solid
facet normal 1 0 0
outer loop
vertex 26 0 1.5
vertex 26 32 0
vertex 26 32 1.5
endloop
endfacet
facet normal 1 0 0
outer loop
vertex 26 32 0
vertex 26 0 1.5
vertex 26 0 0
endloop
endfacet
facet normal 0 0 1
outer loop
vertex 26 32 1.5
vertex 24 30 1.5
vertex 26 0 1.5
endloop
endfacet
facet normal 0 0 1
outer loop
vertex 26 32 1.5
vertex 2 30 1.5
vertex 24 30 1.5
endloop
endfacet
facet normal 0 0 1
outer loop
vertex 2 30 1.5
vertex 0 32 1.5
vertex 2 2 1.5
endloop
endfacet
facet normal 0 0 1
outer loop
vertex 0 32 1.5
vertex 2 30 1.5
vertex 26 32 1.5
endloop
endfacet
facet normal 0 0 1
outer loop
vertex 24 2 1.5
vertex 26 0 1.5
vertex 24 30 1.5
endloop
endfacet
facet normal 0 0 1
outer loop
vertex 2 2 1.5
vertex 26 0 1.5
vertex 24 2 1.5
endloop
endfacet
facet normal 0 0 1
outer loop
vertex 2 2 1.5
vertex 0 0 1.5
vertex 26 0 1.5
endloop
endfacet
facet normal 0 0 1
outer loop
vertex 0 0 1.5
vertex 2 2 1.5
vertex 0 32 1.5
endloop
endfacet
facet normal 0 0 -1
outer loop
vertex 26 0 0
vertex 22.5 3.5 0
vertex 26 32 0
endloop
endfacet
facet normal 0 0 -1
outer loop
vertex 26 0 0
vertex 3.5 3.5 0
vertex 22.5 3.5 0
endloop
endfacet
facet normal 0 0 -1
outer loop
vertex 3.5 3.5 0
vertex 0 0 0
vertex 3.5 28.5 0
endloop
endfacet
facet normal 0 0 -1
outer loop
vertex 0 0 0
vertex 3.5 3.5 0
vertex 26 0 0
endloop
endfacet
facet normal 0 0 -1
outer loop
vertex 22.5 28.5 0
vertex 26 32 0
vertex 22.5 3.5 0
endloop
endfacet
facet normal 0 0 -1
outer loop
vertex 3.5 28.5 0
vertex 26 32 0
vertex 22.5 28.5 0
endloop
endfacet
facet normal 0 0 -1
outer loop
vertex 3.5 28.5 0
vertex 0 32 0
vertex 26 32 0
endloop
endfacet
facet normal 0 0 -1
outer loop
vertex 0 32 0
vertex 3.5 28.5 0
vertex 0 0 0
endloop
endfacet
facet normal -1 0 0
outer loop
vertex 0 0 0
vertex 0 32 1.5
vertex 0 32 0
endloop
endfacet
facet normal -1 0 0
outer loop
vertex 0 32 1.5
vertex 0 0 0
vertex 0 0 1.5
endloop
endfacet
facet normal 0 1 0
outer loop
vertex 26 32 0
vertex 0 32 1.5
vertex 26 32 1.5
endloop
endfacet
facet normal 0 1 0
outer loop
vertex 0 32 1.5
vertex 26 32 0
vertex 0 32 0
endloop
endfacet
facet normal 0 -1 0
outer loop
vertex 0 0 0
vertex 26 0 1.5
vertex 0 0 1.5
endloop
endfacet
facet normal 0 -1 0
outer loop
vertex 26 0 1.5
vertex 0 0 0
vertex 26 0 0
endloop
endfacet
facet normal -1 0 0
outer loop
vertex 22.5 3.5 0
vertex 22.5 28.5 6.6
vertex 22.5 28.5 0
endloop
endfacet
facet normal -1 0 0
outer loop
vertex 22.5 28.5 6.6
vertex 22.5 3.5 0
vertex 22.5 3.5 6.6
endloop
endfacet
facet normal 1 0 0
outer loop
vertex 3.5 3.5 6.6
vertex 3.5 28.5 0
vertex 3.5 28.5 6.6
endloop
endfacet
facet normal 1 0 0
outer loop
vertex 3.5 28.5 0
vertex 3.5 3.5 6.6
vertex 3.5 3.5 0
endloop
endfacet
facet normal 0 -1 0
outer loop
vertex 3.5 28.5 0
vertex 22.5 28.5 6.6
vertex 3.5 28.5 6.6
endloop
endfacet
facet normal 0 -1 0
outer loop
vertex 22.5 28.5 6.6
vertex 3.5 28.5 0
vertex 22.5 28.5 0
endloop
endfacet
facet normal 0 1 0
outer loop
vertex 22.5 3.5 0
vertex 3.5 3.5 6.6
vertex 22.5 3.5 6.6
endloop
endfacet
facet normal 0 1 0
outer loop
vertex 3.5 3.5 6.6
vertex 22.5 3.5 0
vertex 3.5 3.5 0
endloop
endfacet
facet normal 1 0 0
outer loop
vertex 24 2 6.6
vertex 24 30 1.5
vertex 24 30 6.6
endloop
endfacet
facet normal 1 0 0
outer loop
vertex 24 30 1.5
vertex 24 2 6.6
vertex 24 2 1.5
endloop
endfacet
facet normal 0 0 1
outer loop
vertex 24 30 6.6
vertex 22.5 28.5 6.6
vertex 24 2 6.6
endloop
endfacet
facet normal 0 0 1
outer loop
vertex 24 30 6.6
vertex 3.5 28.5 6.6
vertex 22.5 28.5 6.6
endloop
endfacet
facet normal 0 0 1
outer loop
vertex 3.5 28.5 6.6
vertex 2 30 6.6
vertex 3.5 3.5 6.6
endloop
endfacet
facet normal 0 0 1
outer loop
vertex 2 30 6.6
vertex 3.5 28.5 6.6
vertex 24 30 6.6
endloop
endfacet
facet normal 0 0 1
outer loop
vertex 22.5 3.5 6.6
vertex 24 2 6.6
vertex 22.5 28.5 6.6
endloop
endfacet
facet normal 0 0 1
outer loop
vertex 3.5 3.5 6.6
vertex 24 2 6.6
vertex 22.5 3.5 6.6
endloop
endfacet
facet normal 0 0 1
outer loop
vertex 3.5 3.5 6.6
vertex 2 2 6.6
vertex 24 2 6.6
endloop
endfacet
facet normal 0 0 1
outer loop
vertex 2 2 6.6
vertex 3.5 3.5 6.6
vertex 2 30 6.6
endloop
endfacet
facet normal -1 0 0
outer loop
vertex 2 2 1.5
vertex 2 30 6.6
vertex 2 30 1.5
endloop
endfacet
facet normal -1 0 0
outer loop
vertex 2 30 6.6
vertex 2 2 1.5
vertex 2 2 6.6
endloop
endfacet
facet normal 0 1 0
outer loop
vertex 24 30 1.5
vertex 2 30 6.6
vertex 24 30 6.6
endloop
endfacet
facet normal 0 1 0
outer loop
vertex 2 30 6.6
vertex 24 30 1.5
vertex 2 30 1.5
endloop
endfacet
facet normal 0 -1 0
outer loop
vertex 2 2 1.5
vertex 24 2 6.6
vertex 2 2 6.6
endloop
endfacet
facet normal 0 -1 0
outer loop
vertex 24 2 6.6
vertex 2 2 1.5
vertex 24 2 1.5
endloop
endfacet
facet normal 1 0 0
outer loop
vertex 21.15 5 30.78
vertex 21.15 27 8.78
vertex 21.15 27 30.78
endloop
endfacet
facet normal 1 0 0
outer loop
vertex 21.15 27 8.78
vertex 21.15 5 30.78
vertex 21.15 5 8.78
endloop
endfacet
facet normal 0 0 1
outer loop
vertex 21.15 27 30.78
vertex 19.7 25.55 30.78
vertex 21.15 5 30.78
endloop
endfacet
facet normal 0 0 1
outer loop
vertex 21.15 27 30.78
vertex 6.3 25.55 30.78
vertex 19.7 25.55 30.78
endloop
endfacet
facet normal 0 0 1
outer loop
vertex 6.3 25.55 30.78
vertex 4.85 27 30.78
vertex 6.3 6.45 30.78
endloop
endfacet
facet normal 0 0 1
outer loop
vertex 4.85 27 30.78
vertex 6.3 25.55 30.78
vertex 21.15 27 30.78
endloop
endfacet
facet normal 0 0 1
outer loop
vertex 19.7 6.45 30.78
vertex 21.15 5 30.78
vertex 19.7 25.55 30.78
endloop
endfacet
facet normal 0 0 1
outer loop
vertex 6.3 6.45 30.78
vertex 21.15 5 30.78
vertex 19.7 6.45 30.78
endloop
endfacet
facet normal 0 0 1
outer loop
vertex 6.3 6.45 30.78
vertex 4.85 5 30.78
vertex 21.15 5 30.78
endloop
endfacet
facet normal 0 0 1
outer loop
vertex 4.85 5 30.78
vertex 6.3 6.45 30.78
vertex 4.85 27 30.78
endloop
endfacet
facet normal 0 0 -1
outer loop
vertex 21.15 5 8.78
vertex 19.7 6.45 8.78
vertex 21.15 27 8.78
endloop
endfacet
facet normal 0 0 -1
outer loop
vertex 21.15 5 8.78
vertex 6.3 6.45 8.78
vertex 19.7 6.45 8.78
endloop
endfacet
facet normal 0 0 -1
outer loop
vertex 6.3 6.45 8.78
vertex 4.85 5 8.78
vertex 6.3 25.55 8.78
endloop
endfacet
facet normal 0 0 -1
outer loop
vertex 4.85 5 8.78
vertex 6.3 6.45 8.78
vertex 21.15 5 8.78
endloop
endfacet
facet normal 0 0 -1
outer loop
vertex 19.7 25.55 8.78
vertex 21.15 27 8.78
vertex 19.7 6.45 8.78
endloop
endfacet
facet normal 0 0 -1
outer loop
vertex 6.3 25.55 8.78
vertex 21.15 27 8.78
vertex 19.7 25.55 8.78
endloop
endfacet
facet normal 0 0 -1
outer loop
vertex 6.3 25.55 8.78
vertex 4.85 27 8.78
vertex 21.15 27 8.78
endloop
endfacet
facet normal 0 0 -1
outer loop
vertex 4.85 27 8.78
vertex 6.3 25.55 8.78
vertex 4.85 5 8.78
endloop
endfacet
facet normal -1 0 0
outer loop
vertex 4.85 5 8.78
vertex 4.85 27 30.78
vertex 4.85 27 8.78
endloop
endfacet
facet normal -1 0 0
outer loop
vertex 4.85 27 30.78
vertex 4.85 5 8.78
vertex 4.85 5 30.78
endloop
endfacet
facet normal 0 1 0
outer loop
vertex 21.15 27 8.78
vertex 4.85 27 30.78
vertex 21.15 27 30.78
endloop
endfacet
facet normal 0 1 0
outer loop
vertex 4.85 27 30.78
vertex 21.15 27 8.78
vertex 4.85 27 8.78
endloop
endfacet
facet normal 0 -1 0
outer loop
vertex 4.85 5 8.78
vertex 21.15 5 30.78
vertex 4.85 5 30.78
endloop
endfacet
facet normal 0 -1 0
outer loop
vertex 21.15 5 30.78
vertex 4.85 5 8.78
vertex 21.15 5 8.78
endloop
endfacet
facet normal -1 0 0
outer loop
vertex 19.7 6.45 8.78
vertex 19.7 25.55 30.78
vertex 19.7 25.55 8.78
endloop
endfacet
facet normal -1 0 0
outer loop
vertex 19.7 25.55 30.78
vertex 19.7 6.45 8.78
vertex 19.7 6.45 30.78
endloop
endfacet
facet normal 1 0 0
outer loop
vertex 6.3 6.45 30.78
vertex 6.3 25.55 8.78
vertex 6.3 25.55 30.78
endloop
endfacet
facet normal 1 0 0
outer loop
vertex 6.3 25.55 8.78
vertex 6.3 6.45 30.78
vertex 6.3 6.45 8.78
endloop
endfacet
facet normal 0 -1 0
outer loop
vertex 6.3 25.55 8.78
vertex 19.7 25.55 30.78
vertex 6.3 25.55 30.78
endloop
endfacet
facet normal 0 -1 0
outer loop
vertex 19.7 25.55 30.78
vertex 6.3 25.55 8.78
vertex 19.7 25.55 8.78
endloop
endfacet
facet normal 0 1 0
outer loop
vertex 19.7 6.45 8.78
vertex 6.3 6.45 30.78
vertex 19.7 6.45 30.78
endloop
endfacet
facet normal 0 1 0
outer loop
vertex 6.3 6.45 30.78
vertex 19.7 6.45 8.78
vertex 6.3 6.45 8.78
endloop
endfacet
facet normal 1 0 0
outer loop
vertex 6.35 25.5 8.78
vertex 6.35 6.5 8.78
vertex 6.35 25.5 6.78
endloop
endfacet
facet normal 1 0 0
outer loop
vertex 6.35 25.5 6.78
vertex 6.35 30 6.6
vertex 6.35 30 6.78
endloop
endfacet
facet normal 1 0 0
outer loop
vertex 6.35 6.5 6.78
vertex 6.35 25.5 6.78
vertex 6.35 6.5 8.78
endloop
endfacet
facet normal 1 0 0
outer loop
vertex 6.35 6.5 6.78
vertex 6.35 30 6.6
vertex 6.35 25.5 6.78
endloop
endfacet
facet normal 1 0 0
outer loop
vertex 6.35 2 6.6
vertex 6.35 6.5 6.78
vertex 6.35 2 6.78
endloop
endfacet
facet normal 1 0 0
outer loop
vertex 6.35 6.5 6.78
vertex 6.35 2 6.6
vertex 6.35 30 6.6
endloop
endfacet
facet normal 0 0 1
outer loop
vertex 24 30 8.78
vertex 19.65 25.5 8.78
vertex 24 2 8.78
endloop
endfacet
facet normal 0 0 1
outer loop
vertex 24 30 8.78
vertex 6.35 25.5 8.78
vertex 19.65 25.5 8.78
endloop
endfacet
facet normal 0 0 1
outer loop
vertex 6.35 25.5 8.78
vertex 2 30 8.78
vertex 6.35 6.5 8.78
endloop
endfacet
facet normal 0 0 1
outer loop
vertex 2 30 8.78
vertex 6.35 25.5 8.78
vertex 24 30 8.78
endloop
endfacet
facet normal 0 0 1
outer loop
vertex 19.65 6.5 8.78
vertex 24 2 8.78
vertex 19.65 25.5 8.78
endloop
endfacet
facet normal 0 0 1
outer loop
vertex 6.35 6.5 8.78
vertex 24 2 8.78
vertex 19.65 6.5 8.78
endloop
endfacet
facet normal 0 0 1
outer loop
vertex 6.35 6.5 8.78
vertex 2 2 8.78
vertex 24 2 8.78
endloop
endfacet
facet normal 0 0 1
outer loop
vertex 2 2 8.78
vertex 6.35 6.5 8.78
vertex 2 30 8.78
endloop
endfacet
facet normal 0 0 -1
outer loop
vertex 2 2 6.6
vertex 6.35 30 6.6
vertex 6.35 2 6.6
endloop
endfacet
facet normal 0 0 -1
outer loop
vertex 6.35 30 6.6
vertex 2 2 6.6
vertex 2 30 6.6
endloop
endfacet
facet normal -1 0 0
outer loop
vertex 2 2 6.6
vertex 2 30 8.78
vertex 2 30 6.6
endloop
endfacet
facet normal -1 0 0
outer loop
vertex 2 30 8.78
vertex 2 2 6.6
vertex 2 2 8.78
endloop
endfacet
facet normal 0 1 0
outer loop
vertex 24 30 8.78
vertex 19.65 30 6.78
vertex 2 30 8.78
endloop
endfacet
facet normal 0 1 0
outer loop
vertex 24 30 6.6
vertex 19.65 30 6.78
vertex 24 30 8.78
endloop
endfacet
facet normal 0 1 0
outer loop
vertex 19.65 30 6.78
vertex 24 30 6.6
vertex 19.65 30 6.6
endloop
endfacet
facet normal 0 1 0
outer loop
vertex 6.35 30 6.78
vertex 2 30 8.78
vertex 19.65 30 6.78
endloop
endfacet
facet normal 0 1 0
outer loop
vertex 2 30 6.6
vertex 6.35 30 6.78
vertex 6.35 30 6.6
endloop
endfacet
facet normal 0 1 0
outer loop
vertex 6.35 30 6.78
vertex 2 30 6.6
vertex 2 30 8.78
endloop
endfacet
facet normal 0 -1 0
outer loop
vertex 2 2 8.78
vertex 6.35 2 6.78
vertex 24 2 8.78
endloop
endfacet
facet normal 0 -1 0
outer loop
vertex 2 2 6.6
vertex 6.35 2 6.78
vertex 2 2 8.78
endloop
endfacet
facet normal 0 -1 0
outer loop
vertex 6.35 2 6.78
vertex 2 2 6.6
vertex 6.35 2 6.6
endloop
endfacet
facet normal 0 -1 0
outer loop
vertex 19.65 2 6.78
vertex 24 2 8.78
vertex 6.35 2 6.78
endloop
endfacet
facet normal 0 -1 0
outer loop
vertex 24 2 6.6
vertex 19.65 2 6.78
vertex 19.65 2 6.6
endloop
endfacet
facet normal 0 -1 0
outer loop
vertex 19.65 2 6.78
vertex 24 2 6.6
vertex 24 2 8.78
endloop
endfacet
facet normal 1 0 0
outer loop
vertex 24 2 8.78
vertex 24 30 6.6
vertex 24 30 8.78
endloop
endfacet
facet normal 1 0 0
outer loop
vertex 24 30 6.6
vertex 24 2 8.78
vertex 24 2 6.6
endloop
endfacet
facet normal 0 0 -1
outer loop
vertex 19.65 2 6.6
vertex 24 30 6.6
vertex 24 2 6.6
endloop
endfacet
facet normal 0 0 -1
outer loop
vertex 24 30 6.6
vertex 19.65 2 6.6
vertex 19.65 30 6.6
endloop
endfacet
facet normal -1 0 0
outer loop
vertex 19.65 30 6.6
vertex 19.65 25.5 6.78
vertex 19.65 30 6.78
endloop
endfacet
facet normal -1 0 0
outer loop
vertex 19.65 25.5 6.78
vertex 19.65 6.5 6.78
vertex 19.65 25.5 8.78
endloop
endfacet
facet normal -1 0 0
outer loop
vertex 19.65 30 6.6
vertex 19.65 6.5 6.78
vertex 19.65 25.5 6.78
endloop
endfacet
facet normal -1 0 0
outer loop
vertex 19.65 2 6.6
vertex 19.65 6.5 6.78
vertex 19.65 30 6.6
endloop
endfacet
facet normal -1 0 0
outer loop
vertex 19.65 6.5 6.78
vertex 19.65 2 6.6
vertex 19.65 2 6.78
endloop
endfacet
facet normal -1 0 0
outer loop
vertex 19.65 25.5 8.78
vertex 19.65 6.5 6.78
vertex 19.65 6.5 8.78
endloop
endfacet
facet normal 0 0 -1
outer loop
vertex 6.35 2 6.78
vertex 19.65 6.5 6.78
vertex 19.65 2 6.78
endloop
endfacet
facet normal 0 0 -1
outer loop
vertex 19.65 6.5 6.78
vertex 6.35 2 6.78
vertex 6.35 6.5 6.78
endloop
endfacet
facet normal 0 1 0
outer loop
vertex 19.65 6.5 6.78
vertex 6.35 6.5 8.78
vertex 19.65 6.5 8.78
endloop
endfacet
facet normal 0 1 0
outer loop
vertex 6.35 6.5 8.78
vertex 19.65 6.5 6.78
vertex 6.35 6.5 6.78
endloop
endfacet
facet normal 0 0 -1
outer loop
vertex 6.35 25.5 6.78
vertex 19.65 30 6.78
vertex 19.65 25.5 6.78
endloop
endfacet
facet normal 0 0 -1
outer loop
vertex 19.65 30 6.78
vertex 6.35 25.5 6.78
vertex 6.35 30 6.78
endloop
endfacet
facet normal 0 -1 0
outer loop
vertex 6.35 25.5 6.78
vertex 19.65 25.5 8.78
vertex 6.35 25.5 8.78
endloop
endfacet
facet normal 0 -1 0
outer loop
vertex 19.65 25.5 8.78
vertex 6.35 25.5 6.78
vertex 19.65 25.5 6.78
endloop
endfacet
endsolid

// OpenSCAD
// Switch Socket for mounting the switch below the panel
// KBS3056 29.12.2018
switch_width            = 13.3;// without collet
switch_length           = 19;  // without collet
switch_deepth           = 24;  // without collet, with or without terminals
switch_bridge_thickness = 2;   // default 2

sunk_width              = 19;  // bigger than switch collet
sunk_length             = 25;  // bigger than switch collet
sunk_deepth             = 6.6;   // bigger than switch collet height + lever

collet_brim             = 2;   // default 2
collet_height           = 1.5; // default 1.5

wall_thickness          = 1.5; // default 1.5
///////////////////////////////////////////////////////////////////////////
switch_cover            = 1;// [0:1]



union(){
    //collet
    difference(){
        cube([sunk_width + 2 * wall_thickness + 2 * collet_brim, sunk_length + 2 * wall_thickness + 2 * collet_brim, collet_height]);
        translate([collet_brim + wall_thickness, collet_brim + wall_thickness, -0.1])
        cube([sunk_width, sunk_length, collet_height + 0.2]);
    }
    
    //sunk
    translate([collet_brim, collet_brim, collet_height]){
        difference(){
            cube([sunk_width + 2 * wall_thickness, sunk_length + 2 *    wall_thickness, sunk_deepth - collet_height]);
            translate([wall_thickness, wall_thickness, -0.1])
            cube([sunk_width, sunk_length, sunk_deepth - collet_height + 0.2]);
        }
    }
    
    //switch
    translate([collet_brim, collet_brim, sunk_deepth]){
        cube([(sunk_width - switch_width) / 2 + wall_thickness, sunk_length + 2 * wall_thickness, switch_bridge_thickness + 0.18]);
        translate([sunk_width - (sunk_width - switch_width) / 2 + wall_thickness, 0, 0])
        cube([(sunk_width - switch_width) / 2 + wall_thickness, sunk_length + 2 * wall_thickness, switch_bridge_thickness + 0.18]);
        
        translate([0, 0, 0.18])
        cube([sunk_width + 2 * wall_thickness, (sunk_length - switch_length) / 2 + wall_thickness, switch_bridge_thickness]); 
        translate([0, sunk_length - (sunk_length - switch_length) / 2 + wall_thickness, 0.18])
        cube([sunk_width + 2 * wall_thickness, (sunk_length - switch_length) / 2 + wall_thickness, switch_bridge_thickness]); 
        
        //switch cover
        if (switch_cover){
            translate([(sunk_width - switch_width) / 2, (sunk_length - switch_length) / 2, switch_bridge_thickness + 0.18]){
                difference(){
                    cube([switch_width + 2 * wall_thickness, switch_length + 2 * wall_thickness, switch_deepth - switch_bridge_thickness]);
                    translate([wall_thickness - 0.05, wall_thickness - 0.05, -0.1])
                    cube([switch_width + 0.1, switch_length + 0.1, switch_deepth - switch_bridge_thickness + 0.2]);
                }
            }
        }
    }
}
